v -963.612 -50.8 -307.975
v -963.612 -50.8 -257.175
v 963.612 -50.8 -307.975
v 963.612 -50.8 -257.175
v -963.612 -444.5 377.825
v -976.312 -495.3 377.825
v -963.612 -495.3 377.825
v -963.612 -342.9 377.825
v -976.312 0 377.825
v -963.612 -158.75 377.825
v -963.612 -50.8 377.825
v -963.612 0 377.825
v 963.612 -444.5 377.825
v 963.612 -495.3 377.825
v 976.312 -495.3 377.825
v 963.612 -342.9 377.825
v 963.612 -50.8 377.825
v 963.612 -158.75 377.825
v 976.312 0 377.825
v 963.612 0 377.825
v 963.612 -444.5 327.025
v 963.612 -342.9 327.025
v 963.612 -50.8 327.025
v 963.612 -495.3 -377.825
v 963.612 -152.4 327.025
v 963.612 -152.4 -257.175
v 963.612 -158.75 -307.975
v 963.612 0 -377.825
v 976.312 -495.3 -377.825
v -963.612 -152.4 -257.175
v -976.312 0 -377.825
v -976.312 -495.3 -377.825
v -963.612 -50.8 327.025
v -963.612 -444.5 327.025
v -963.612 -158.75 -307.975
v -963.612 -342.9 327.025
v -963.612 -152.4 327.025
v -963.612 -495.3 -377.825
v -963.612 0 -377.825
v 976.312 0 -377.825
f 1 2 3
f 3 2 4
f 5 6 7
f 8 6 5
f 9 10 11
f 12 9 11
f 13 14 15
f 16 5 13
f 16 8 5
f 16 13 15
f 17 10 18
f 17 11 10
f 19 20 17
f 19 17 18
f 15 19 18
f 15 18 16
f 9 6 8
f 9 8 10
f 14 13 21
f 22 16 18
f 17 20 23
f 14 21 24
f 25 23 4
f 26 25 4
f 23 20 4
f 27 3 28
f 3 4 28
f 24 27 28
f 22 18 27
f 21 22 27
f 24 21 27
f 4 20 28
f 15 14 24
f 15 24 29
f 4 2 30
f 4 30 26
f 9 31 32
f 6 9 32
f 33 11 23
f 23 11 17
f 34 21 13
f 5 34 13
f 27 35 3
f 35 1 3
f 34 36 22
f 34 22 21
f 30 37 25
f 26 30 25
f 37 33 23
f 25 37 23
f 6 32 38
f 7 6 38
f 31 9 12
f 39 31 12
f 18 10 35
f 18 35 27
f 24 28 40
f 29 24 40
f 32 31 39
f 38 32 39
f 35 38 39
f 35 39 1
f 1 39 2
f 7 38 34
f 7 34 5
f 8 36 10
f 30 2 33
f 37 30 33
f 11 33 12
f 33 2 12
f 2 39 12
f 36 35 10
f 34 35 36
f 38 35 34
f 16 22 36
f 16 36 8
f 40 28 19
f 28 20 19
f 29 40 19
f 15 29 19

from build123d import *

# Parameters (mm, degrees)
F0_W     = 12.7
F0_H     = 69.85
F0_H_2   = 50.8
F0_H_3   = 584.2
F1_DEPTH = 495.3
F0_W_2   = 1927.225
F2_DEPTH = 152.4
F3_DEPTH = 158.75
F4_DEPTH = 495.3
F5_DEPTH = 50.8
F6_W     = 101.6
F6_H     = 50.8
F7_DEPTH = 1952.625
F8_DEPTH = 152.4


with BuildPart() as f1:
    # F0 (on Front) → F1 (new body)
    with BuildSketch(Plane.XZ):
        with Locations((-969.9625, -342.9)):
            Rectangle(F0_W, F0_H)
        with Locations((-969.9625, -282.575)):
            Rectangle(F0_W, F0_H_2)
        with Locations((-969.9625, 34.925)):
            Rectangle(F0_W, F0_H_3)
        with Locations((-969.9625, 352.425)):
            Rectangle(F0_W, F0_H_2)
    extrude(amount=F1_DEPTH)

    # F0 (on Front) → F2 (join)
    with BuildSketch(Plane.XZ):
        with Locations((0, 352.425)):
            Rectangle(F0_W_2, F0_H_2)
        with Locations((0, -282.575)):
            Rectangle(F0_W_2, F0_H_2)
    extrude(amount=F2_DEPTH)

    # F0 (on Front) → F3 (join)
    with BuildSketch(Plane.XZ):
        with Locations((0, 34.925)):
            Rectangle(F0_W_2, F0_H_3)
        with Locations((0, 352.425)):
            Rectangle(F0_W_2, F0_H_2)
        with Locations((0, -282.575)):
            Rectangle(F0_W_2, F0_H_2)
    extrude(amount=F3_DEPTH)

    # F0 (on Front) → F4 (join)
    with BuildSketch(Plane.XZ):
        with Locations((969.9625, 34.925)):
            Rectangle(F0_W, F0_H_3)
        with Locations((969.9625, 352.425)):
            Rectangle(F0_W, F0_H_2)
        with Locations((969.9625, -282.575)):
            Rectangle(F0_W, F0_H_2)
        with Locations((969.9625, -342.9)):
            Rectangle(F0_W, F0_H)
    extrude(amount=F4_DEPTH)

    # F0 (on Front) → F5 (cut)
    with BuildSketch(Plane.XZ):
        with Locations((0, 352.425)):
            Rectangle(F0_W_2, F0_H_2)
        with Locations((0, -282.575)):
            Rectangle(F0_W_2, F0_H_2)
    extrude(amount=F5_DEPTH, mode=Mode.SUBTRACT)

    # F6 (on face) → F7 (join, through all)
    with BuildSketch(Plane(origin=(-976.3125, 0, 0), x_dir=(0, -1, 0), z_dir=(-1, 0, 0))):
        with Locations((393.7, 352.425)):
            Rectangle(F6_W, F6_H)
    extrude(amount=-F7_DEPTH)

    # F0 (on Front) → F8 (cut)
    with BuildSketch(Plane.XZ):
        with Locations((0, 34.925)):
            Rectangle(F0_W_2, F0_H_3)
    extrude(amount=F8_DEPTH, mode=Mode.SUBTRACT)


solid = f1.part
